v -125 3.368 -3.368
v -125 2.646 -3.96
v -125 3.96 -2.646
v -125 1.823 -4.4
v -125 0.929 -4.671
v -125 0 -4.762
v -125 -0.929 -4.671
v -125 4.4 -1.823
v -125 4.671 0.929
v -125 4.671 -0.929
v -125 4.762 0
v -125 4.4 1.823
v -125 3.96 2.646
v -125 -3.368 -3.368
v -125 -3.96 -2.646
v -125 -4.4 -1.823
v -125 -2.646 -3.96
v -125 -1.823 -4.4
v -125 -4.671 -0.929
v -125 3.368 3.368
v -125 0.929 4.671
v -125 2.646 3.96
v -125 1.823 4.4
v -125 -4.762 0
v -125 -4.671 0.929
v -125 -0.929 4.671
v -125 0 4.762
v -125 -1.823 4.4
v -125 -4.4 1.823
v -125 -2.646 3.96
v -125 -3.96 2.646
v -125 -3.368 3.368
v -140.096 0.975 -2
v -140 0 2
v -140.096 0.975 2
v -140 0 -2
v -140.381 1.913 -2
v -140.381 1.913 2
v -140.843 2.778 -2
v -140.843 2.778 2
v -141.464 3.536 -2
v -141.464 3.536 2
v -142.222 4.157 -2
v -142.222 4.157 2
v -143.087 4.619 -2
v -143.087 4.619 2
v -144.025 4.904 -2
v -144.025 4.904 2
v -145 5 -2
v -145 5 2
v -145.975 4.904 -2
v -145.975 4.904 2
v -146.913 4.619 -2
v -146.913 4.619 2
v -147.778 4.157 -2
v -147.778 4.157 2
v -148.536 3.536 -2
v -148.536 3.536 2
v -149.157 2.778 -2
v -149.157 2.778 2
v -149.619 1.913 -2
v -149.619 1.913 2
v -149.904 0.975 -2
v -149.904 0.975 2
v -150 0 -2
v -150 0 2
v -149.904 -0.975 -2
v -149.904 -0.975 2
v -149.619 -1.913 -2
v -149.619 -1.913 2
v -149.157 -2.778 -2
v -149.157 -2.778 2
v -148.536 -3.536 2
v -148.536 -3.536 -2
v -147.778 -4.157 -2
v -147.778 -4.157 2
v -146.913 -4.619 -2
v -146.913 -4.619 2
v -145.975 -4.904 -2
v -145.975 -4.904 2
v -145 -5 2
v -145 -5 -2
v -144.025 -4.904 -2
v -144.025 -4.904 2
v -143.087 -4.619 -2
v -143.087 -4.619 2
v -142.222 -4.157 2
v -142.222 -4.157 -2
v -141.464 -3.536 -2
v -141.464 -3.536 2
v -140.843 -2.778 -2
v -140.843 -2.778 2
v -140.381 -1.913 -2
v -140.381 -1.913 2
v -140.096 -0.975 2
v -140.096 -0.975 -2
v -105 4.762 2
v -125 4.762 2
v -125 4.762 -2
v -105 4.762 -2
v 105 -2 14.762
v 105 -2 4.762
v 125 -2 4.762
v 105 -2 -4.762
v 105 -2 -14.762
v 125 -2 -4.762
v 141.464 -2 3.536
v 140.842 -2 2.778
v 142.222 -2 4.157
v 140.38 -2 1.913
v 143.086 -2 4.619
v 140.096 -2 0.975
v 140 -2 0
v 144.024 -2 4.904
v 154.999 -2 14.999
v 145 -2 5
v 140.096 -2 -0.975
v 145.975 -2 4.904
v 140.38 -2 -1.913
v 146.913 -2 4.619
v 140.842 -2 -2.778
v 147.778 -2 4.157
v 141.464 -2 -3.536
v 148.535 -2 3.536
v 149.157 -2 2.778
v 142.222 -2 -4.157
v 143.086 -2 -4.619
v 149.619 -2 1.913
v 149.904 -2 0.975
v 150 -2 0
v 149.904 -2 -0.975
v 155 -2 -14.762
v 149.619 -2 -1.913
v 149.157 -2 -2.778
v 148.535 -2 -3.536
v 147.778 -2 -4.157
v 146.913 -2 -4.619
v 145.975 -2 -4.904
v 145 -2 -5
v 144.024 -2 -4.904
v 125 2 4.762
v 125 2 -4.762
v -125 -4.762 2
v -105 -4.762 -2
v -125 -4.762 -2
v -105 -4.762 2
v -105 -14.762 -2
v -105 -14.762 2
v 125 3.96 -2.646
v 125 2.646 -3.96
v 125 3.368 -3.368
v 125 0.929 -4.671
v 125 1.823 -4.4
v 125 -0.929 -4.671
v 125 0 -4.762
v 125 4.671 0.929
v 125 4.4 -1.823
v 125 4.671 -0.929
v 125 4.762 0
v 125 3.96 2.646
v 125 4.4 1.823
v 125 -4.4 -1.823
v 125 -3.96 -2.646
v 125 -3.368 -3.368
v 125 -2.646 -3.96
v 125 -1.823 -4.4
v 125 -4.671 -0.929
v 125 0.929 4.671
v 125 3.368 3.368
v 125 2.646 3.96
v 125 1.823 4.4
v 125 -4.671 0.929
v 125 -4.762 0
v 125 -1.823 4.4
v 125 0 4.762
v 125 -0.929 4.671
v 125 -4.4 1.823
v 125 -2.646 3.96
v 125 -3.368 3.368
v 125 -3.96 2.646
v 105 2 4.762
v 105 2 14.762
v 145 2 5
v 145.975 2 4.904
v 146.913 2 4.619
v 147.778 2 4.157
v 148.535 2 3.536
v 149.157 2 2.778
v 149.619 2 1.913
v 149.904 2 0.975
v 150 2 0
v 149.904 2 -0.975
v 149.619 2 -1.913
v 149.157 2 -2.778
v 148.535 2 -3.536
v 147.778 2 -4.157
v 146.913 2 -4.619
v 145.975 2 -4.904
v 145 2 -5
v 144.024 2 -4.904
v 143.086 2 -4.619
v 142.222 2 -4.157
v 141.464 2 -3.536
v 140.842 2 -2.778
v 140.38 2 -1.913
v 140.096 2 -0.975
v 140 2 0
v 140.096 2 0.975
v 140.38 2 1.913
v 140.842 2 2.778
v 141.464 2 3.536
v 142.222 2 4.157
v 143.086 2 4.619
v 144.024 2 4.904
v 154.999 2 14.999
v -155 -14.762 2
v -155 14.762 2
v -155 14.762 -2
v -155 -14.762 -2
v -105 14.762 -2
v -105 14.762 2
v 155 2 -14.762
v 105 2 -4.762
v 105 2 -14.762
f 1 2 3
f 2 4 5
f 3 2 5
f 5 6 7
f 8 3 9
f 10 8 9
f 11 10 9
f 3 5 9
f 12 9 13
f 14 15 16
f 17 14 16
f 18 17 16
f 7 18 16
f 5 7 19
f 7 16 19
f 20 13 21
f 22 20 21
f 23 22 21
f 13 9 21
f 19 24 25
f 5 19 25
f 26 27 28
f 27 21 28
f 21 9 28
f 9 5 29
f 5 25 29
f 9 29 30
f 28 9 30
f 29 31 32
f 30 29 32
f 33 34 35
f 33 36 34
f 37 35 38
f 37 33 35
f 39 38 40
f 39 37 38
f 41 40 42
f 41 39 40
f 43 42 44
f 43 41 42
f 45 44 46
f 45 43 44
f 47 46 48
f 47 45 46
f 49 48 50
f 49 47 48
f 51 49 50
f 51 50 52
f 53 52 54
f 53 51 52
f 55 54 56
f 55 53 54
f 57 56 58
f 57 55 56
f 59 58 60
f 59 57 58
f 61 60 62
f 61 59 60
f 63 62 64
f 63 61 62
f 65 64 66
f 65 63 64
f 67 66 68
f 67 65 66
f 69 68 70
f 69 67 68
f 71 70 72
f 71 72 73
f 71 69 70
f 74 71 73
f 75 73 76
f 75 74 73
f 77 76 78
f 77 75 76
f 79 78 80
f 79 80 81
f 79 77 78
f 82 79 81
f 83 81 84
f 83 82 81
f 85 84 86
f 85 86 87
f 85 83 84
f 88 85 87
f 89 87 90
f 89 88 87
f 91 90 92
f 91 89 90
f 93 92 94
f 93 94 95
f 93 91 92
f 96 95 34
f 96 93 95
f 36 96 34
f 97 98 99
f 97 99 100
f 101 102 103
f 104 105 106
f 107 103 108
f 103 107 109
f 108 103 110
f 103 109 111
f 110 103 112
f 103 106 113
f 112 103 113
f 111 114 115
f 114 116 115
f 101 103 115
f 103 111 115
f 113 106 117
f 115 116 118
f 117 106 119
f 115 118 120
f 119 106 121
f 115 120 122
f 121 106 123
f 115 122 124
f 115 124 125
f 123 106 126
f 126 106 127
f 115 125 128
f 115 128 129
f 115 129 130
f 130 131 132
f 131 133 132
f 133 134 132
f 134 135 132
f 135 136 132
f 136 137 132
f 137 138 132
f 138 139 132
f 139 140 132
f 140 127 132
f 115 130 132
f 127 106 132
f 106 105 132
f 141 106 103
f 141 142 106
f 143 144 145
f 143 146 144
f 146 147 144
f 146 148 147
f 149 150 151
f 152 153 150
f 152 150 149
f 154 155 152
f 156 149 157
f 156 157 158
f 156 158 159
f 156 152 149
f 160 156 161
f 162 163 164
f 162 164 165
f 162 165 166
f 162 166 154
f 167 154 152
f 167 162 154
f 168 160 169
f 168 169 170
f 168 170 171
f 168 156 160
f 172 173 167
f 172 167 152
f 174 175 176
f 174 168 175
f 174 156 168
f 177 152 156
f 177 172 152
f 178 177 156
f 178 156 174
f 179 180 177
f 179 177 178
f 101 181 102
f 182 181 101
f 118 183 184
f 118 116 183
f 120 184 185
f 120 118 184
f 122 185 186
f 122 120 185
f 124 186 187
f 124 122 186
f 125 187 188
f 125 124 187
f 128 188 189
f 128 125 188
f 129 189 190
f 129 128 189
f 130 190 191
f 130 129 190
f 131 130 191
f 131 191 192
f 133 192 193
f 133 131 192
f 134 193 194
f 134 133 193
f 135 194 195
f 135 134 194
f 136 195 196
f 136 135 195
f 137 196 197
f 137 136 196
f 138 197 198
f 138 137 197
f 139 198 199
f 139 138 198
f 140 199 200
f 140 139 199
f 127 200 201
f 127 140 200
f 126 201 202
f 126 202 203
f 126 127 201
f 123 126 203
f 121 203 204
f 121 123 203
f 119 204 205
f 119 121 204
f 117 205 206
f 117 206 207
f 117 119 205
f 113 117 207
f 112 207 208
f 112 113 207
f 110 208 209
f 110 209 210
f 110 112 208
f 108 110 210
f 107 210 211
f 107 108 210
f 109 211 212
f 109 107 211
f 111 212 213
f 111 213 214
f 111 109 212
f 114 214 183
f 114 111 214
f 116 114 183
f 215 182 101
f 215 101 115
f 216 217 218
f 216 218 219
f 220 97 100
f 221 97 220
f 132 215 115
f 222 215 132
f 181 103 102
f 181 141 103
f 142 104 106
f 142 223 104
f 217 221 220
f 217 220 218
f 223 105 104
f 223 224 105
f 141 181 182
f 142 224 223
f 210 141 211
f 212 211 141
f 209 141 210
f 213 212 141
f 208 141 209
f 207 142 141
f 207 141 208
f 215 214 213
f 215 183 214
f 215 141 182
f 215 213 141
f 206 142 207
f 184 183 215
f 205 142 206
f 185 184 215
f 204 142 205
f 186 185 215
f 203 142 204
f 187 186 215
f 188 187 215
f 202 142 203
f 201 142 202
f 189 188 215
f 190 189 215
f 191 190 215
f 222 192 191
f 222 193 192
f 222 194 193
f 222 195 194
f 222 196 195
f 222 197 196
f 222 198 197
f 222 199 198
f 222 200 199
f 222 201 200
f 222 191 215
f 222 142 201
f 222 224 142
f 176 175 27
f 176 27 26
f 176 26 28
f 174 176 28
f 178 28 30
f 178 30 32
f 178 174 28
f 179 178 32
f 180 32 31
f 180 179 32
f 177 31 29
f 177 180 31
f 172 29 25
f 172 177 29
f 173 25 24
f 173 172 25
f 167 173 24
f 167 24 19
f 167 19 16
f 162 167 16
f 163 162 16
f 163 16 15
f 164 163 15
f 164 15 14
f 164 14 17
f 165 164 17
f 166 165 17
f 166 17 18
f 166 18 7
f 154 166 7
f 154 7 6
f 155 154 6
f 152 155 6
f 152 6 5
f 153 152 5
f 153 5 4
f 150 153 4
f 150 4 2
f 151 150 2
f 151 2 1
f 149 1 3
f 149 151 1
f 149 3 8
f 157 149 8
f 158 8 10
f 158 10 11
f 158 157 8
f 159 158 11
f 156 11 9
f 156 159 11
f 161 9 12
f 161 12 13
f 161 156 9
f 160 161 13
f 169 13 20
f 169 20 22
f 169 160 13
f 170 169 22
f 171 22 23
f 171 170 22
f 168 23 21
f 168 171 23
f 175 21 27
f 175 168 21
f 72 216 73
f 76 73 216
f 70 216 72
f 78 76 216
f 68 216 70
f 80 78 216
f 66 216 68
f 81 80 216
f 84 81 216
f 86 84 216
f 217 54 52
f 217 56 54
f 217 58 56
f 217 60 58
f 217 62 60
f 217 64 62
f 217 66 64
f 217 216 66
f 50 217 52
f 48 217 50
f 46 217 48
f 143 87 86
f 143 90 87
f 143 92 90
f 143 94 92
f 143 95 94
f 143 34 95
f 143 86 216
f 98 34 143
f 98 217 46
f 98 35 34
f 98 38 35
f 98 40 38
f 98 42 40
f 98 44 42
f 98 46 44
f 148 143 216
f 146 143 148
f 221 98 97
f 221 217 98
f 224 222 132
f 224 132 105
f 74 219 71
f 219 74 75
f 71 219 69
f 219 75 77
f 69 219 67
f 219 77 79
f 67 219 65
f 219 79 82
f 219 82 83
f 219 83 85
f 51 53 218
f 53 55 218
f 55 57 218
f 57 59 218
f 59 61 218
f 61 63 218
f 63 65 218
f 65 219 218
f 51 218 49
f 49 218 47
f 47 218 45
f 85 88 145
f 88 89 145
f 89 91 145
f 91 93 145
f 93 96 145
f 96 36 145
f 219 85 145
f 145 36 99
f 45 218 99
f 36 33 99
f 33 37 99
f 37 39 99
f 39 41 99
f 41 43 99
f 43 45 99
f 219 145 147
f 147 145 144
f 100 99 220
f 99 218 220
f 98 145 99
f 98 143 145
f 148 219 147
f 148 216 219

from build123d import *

# Parameters (mm, degrees)
SWEEP1_PROFILE_R    = 4.7625
SKETCH18_R          = 5
BOSS_EXTRUDE4_DEPTH = 2
SKETCH19_R          = 5
BOSS_EXTRUDE6_DEPTH = 2


with BuildPart() as part:
    # Sweep1: sweep along a path in Sketch1
    with BuildLine(Plane(origin=(0, 0, 0), x_dir=(1, 0, 0), z_dir=(0, 1, 0))) as sweep1_path:
        Line((-125, 0), (125, 0))
    # Sweep1 profile (on start of the path) → Sweep1 (sweep)
    with BuildSketch(Plane(origin=(-125, 0, 0), x_dir=(0, 0, 1), z_dir=(1, 0, 0))):
        Circle(SWEEP1_PROFILE_R)
    sweep(path=sweep1_path.line)


with BuildPart() as body_2:
    # Sketch18 → Boss-Extrude4 (new, symmetric)
    with BuildSketch(Plane.XY):
        Polygon((-125, -4.7625), (-125, 4.7625), (-105, 4.7625), (-105, 14.7625), (-155, 14.7625), (-155, -14.7625), (-105, -14.7625), (-105, -4.7625), align=None)
        with Locations((-145, 0)):
            Circle(SKETCH18_R, mode=Mode.SUBTRACT)
    extrude(amount=BOSS_EXTRUDE4_DEPTH, both=True)


with BuildPart() as body_3:
    # Sketch19 → Boss-Extrude6 (new, symmetric)
    with BuildSketch(Plane(origin=(0, 0, 0), x_dir=(1, 0, 0), z_dir=(0, 1, 0))):
        Polygon((125, -4.7625), (105, -4.7625), (105, -14.7625), (154.999441534, -14.998818204), (155, 14.7625), (105, 14.7625), (105, 4.7625), (125, 4.7625), align=None)
        with Locations(Location((144.999722982, 0, 0), (0, 0, 270))):
            Circle(SKETCH19_R, mode=Mode.SUBTRACT)
    extrude(amount=BOSS_EXTRUDE6_DEPTH, both=True)


solid = Compound([part.part, body_2.part, body_3.part])
